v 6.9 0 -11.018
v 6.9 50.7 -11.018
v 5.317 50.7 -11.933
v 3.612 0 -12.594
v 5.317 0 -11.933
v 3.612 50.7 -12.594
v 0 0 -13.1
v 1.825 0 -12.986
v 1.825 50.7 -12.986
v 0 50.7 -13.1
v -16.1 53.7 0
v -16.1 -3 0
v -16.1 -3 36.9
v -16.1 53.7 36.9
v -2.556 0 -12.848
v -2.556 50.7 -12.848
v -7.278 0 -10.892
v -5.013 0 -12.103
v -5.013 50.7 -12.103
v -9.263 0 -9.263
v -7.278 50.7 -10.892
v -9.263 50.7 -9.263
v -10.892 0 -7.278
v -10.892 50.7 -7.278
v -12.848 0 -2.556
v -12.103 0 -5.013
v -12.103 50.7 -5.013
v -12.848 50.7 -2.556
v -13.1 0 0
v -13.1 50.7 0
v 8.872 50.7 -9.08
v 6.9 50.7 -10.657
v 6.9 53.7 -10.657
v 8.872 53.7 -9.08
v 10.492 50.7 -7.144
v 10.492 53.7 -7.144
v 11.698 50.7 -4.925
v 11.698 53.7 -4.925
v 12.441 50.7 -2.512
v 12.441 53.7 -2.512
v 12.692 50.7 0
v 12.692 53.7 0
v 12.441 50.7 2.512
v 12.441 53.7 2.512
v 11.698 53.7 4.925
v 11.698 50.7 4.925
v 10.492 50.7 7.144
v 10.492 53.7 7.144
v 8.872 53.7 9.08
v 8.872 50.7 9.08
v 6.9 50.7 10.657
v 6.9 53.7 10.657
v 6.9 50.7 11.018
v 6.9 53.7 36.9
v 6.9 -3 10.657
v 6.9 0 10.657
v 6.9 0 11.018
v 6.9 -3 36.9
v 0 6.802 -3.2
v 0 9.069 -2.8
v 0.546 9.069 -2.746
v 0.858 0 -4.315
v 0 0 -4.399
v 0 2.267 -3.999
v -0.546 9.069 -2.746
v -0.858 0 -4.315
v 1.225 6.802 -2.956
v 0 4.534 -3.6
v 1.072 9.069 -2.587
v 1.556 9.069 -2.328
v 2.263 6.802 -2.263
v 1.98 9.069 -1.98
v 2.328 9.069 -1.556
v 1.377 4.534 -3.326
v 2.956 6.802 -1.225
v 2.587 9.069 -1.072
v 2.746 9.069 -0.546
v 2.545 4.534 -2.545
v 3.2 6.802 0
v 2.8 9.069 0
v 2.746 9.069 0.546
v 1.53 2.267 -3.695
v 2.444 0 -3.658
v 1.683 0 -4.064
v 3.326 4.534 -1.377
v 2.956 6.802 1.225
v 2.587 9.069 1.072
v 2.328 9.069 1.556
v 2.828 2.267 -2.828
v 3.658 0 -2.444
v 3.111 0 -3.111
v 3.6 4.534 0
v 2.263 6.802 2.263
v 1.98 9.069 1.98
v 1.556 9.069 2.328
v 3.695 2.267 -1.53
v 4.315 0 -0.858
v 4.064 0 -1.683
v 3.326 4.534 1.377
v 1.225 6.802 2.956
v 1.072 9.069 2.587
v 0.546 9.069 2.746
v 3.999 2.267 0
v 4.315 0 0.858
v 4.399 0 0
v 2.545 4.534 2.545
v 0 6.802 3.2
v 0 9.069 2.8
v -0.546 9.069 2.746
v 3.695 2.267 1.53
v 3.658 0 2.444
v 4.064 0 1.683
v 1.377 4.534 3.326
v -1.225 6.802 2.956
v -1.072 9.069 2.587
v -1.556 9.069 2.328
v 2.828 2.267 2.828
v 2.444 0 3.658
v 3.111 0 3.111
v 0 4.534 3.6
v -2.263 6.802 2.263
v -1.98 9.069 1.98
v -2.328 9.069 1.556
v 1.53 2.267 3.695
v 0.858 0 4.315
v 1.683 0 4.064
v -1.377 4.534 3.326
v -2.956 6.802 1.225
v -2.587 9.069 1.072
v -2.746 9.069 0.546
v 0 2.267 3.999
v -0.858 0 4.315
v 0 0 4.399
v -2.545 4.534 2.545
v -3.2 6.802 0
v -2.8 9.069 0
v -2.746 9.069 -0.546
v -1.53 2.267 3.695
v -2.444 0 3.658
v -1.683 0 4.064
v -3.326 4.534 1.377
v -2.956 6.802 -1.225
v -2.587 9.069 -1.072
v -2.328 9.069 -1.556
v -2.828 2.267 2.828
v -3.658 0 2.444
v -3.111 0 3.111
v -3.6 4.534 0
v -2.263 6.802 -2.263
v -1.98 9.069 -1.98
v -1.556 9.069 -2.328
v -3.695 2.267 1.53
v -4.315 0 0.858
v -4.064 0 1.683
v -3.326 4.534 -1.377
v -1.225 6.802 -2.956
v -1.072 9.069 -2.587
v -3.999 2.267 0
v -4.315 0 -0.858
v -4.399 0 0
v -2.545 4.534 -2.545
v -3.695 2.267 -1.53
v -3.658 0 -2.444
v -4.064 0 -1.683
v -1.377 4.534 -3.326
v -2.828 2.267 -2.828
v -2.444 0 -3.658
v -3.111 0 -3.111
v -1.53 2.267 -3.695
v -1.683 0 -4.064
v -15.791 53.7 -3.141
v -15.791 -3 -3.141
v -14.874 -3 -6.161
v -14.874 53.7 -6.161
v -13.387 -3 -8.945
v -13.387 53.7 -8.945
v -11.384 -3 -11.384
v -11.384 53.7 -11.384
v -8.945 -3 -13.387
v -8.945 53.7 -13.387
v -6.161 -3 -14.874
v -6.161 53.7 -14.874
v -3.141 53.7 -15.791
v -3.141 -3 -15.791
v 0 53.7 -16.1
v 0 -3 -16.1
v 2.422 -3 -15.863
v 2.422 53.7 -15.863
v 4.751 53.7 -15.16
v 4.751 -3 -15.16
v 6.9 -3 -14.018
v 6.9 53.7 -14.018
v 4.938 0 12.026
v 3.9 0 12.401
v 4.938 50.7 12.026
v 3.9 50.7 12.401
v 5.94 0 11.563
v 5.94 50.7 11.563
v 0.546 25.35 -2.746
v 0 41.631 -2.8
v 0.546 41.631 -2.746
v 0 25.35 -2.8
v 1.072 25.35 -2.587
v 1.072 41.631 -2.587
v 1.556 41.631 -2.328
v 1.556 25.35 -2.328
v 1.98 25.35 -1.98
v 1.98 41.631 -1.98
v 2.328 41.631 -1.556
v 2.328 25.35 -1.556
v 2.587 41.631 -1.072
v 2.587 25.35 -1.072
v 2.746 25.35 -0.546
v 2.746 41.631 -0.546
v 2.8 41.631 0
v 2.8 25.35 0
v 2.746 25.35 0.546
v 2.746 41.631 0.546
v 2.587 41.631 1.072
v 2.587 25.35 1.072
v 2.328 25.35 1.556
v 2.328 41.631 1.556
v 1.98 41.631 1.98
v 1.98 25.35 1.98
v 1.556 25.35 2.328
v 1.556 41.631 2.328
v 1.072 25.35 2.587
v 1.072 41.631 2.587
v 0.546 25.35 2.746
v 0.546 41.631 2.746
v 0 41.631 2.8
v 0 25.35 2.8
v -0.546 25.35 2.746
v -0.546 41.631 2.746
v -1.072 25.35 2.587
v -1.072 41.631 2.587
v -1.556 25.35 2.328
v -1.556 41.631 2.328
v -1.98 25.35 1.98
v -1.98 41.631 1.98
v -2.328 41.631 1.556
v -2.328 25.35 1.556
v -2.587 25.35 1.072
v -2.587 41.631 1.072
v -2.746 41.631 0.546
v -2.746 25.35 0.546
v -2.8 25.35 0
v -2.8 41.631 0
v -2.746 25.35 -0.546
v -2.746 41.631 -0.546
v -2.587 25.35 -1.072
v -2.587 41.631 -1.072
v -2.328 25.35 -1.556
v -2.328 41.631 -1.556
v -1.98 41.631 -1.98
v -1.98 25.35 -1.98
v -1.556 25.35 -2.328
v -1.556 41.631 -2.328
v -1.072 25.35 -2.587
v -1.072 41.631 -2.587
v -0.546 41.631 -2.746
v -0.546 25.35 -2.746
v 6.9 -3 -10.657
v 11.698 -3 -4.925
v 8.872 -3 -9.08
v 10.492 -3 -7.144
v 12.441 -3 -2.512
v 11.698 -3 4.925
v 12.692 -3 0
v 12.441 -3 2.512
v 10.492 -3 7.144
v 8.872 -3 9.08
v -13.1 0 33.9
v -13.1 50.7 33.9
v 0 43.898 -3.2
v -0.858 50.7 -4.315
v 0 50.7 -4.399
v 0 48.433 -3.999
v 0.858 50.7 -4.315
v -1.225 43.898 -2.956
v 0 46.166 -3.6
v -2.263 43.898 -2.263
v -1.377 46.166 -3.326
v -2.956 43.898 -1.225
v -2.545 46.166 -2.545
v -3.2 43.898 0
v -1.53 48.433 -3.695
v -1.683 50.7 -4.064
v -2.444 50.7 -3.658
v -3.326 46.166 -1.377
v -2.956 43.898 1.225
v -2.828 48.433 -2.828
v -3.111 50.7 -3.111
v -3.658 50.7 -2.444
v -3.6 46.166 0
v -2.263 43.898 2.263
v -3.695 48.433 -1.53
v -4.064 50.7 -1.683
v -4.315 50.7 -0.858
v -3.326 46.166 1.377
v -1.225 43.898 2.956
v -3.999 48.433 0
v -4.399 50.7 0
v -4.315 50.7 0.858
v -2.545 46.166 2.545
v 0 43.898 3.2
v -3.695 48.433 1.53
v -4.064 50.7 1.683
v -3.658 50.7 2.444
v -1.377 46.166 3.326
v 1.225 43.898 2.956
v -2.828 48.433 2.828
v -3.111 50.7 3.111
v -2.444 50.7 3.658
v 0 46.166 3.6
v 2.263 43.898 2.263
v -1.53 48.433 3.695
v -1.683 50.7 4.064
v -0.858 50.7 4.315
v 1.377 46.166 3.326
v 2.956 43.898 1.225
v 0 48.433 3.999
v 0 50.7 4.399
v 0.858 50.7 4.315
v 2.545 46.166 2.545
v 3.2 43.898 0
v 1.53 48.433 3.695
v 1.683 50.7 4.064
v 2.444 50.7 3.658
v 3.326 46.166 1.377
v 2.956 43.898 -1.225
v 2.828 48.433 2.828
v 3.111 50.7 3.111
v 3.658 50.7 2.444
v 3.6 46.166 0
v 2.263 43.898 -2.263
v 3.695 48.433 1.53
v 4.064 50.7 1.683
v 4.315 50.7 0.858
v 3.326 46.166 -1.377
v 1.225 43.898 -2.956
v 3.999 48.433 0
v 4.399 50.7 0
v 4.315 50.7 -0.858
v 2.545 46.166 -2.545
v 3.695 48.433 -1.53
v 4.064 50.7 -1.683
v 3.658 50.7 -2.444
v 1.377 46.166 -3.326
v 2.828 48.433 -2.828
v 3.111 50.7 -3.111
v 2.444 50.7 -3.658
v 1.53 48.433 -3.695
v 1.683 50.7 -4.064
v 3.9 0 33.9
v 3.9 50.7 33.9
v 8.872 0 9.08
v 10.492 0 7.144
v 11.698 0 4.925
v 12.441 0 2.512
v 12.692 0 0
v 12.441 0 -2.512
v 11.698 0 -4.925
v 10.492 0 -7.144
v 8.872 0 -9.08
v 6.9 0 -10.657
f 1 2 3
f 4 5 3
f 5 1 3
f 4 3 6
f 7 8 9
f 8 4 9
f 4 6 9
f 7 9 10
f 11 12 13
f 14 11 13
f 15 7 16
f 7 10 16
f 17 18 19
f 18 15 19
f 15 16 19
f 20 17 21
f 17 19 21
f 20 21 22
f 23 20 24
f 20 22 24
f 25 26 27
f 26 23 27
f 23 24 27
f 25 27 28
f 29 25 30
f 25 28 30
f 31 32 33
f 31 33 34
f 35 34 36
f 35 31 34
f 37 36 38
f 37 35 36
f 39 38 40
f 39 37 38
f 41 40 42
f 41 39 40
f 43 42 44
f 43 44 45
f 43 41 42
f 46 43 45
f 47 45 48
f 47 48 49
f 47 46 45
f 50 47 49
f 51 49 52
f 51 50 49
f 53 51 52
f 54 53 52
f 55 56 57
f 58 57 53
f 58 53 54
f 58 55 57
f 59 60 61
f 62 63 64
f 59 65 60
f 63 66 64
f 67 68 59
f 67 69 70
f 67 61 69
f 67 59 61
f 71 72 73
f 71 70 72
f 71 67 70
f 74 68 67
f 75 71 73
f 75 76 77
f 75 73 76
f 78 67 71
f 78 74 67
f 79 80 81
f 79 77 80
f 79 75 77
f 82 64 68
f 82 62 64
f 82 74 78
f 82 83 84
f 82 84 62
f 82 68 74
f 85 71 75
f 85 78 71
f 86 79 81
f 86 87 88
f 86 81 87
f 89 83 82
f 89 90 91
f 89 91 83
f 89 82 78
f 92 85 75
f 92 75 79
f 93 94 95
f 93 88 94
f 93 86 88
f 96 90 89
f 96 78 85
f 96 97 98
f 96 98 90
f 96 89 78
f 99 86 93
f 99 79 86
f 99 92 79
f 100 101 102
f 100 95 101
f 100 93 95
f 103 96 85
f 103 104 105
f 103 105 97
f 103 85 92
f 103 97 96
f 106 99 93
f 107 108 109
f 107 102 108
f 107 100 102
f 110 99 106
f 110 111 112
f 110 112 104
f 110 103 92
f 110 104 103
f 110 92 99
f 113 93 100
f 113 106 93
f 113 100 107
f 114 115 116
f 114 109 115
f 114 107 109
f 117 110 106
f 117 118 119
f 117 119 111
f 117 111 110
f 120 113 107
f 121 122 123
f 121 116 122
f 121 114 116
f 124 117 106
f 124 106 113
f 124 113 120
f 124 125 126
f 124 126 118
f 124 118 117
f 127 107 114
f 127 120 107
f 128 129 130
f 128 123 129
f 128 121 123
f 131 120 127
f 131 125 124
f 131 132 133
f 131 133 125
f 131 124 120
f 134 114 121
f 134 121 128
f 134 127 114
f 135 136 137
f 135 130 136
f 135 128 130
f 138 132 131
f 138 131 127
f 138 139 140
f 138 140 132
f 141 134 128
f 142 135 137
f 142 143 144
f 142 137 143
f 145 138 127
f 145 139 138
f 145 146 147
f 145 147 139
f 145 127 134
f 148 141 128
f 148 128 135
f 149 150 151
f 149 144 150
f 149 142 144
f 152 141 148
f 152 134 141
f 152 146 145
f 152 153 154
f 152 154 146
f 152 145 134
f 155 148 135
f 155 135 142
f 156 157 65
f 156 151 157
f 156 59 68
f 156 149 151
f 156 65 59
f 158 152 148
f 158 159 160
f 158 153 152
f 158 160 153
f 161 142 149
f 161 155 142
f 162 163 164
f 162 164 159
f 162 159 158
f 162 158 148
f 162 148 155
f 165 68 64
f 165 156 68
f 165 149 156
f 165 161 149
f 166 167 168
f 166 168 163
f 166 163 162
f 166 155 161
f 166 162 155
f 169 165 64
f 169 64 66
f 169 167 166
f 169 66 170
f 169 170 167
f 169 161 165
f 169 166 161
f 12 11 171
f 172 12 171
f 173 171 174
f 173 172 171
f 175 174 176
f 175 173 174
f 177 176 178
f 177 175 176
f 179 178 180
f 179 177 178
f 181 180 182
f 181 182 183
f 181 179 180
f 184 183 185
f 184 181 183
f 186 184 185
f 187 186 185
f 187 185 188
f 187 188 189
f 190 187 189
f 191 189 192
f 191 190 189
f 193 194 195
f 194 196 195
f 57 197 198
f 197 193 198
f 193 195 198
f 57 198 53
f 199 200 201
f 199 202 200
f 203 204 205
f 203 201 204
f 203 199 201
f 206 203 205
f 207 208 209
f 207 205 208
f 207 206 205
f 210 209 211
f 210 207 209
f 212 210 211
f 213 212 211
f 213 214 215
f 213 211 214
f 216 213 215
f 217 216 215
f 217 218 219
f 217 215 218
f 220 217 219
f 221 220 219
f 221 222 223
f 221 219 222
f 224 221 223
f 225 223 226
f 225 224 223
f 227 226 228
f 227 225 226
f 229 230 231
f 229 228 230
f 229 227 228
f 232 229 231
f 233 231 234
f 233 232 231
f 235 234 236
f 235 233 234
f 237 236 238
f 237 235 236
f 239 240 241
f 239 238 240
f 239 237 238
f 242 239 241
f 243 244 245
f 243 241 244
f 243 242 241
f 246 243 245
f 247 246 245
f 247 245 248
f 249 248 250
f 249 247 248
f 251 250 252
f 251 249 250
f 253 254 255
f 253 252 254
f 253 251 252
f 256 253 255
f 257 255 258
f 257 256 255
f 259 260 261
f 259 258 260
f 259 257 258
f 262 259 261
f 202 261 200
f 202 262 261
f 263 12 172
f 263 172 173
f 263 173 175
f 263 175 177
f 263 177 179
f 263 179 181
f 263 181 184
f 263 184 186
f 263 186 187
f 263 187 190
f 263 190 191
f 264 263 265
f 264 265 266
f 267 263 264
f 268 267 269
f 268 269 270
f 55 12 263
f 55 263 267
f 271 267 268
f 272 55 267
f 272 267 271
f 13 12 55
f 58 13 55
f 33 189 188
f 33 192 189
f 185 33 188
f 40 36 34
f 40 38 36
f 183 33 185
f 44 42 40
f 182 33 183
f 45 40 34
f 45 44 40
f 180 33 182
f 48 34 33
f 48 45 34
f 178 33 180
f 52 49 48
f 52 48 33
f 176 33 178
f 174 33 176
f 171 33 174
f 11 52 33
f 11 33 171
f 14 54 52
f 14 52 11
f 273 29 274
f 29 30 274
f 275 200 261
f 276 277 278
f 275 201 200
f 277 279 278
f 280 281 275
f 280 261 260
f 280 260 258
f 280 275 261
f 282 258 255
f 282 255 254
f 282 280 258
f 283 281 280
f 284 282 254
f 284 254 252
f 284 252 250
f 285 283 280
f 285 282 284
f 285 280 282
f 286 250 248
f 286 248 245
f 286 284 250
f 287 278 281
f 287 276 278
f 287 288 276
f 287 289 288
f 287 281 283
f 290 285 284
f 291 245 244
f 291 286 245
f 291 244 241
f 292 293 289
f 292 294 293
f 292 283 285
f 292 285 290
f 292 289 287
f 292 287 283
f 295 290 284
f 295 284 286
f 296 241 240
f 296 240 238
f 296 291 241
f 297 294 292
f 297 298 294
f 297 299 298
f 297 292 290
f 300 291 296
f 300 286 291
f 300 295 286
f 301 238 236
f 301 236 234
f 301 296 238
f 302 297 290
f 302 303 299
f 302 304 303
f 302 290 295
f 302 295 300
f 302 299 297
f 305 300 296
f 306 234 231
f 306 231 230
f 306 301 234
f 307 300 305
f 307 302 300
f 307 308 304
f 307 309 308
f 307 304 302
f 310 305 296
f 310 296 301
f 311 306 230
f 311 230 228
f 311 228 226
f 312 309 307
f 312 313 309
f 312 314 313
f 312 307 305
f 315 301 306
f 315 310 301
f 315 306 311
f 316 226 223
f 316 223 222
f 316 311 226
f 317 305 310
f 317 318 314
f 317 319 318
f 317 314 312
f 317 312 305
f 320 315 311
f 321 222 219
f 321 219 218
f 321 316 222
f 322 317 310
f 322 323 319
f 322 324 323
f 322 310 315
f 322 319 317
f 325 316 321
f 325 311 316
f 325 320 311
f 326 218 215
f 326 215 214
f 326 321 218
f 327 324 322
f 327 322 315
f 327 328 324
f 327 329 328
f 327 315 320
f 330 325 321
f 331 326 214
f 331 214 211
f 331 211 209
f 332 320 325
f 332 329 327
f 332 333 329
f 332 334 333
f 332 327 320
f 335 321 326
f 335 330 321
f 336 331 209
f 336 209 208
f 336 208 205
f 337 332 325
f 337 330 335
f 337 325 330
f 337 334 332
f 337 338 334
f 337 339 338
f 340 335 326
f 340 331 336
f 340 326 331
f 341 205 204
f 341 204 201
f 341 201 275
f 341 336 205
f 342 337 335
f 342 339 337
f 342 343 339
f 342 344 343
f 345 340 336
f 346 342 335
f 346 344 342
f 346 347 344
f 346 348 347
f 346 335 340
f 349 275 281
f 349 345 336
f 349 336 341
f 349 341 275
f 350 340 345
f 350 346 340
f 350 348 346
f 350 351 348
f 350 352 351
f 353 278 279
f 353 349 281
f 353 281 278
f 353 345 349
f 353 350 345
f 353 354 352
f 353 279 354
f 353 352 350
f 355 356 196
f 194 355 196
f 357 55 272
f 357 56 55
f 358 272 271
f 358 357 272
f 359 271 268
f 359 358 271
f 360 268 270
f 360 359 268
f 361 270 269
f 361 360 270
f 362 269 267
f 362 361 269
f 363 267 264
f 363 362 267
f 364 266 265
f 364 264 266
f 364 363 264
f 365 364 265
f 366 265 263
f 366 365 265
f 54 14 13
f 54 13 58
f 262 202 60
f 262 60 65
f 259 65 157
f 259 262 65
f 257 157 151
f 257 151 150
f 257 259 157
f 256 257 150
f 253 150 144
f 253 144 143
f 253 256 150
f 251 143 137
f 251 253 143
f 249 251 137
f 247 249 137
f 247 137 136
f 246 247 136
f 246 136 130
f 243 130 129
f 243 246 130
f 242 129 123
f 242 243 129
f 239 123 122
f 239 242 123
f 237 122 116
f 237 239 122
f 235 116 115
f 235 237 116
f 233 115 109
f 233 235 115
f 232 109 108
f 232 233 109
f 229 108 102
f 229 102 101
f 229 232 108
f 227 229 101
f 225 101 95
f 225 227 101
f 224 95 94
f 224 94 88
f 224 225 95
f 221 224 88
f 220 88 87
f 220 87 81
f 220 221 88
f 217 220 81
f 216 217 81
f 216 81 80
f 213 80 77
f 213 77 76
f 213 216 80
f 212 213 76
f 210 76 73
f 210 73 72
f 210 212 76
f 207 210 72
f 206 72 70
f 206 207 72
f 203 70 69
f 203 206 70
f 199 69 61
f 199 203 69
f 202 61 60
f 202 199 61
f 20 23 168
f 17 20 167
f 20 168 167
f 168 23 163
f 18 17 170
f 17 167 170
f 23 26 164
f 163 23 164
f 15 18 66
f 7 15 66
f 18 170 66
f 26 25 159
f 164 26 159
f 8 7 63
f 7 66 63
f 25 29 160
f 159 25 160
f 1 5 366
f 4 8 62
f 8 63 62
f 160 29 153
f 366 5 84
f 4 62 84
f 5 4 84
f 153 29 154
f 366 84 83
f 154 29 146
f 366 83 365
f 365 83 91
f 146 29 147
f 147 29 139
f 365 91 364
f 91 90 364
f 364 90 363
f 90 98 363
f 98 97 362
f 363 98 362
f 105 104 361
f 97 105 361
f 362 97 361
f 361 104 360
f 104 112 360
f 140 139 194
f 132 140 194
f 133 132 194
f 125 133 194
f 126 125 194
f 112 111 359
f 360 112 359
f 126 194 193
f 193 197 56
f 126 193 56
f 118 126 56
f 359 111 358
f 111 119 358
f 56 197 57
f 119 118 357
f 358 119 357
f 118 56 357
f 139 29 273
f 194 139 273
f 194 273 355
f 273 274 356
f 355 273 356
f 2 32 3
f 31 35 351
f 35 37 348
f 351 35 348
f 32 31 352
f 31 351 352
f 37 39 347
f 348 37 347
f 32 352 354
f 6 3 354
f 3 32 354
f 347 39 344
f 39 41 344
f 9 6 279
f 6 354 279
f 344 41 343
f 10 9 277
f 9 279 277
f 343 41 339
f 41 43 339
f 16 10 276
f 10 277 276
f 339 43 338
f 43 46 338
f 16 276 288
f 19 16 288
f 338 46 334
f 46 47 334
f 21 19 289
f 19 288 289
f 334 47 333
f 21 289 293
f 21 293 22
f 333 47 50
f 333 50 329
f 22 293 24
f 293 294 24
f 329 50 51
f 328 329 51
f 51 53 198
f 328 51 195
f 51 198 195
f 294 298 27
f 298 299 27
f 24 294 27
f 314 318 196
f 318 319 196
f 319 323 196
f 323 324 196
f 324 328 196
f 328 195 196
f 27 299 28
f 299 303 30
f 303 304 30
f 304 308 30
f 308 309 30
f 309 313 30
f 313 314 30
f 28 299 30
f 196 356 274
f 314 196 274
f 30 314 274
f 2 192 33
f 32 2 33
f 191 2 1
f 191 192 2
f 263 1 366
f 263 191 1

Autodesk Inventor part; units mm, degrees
ref_plane "YZ Plane" through (0, 0, 0) normal (1, 0, 0) x (0, 1, 0)
ref_plane "XZ Plane" through (0, 0, 0) normal (0, 1, 0) x (-1, 0, 0)
ref_plane "XY Plane" through (0, 0, 0) normal (0, 0, 1) x (1, 0, 0)
sketch "Sketch1" plane through (0, 0, 0) normal (1, 0, 0) x (0, 1, 0)
  line L0 (0, 0) -> (0, -9.15) construction
  line L1 (0, -9.15) -> (9.0687, -2.8) construction
  line L2 (9.0687, -2.8) -> (9.0687, 0) construction
  line L3 (0, -9.15) -> (0, -29.4542) construction
  line L4 (0, 0) -> (49.8191, 0) construction
  line L5 (9.0687, 0) -> (0, 0)
  line L6 (9.0687, -2.8) -> (25.35, -2.8)
  line L7 (25.35, -2.8) -> (25.35, 0)
  line L8 (25.35, 0) -> (9.0687, 0)
  line L9 (9.0687, -2.8) -> (0, -4.3991)
  line L10 (0, 0) -> (0, -4.3991)
  dimension "d1" = 125
  dimension "d2" = 5.6
  dimension "d3" = 9.15
  dimension "d5" = 9.0687
  dimension "d6" = 25.35
  dimension "d8" = 80
revolve "Revolution1" add sketch "Sketch1" angle 360 about axis through (0, 0, 0) along (0, 1, 0)
sketch "Sketch2" plane through (0, 0, 0) normal (0, -1, 0) x (1, 0, 0)
  line L0 (6.9, -13.1) -> (-16.1, -13.1) construction
  line L1 (-16.1, -13.1) -> (-16.1, 36.9)
  line L2 (-16.1, 36.9) -> (6.9, 36.9)
  line L3 (6.9, 36.9) -> (6.9, -13.1) construction
  circle A0 centre (0, 0) radius 12.5 construction
  circle A1 centre (0, 0) radius 13 construction
  line L4 (6.9, -13.1) -> (6.9, -11.0177) construction
  line L5 (6.9, 36.9) -> (6.9, 11.0177)
  line L6 (0, -13.1) -> (0, -13) construction
  line L7 (3.9, 12.4012) -> (3.9, 33.9)
  line L8 (3.9, 33.9) -> (-13.1, 33.9)
  line L9 (-13.1, 33.9) -> (-13.1, 0)
  arc A2 (6.9, 11.0177) -> (3.9, 12.4012) centre (0, 0) ccw
  arc A3 (-13.1, 0) -> (0, -13.1) centre (0, 0) ccw
  line L10 (0, -13.1) -> (0, -16.1) construction
  line L11 (-13.1, 0) -> (-13, 0) construction
  circle A4 centre (0, 0) radius 2.8 projected
  line L12 (0, 0) -> (-13, 0) construction
  arc A5 (0, -13.1) -> (6.9, -11.0177) centre (0.1762, -1.2107) ccw
  line L13 (-13.1, 0) -> (-16.1, 0) construction
  arc A6 (-16.1, 0) -> (0, -16.1) centre (0, 0) ccw
  line L14 (6.9, -11.0177) -> (6.9, -14.0177)
  arc A7 (0, -16.1) -> (6.9, -14.0177) centre (0, -3.6267) ccw
  dimension "d9" = 25
  dimension "d10" = 0.5
  dimension "d11" = 3
  dimension "d12" = 3
  dimension "d13" = 3
  dimension "d15" = 3
  dimension "d16" = 23
  dimension "d18" = 0.1
  dimension "d19" = 0.1
  dimension "d22" = 3
  dimension "d23" = 11.8906
  dimension "d24" = 50
extrude "Extrusion1" add sketch "Sketch2" against normal up to surface (25.35 mm away) contours L1 L2 L5 A2 L7 L8 L9 A3 A5 L14 A7 A6
sketch "Sketch3" plane through (0, 0, 0) normal (0, -1, 0) x (1, 0, 0)
  line L0 (6.9, 11.0177) -> (6.9, 36.9) projected
  line L1 (6.9, 36.9) -> (-16.1, 36.9) projected
  line L2 (-16.1, 36.9) -> (-16.1, 0) projected
  arc A0 (-16.1, 0) -> (0, -16.1) centre (0, 0) ccw projected
  arc A1 (0, -16.1) -> (6.9, -14.0177) centre (0, -3.6267) ccw projected
  line L3 (6.9, -14.0177) -> (6.9, -11.0177) projected
  arc A2 (0, -13.1) -> (6.9, -11.0177) centre (0.1762, -1.2107) ccw construction
  line L4 (6.9, 11.0177) -> (6.9, -11.0177) construction
  arc A3 (6.9, -10.4177) -> (6.9, 10.4177) centre (-0.0081, 0) ccw construction
  arc A4 (6.9, -10.6569) -> (6.9, 10.6569) centre (-0.0081, 0) ccw
  line L5 (6.9, 0) -> (12.6919, 0) construction
  line L6 (6.9, -10.6569) -> (6.9, -11.0177)
  line L7 (6.9, 11.0177) -> (6.9, 10.6569)
  point P0 (0, 0)
  dimension "d29" = 12.5
  dimension "d30" = 0.2
  dimension "d31" = 0.6
extrude "Extrusion2" add sketch "Sketch3" along normal blind 3
mirror "Mirror1" about plane through (0, 25.35, 0) normal (0, 1, 0) of "Extrusion1", "Extrusion2", "Revolution1"
